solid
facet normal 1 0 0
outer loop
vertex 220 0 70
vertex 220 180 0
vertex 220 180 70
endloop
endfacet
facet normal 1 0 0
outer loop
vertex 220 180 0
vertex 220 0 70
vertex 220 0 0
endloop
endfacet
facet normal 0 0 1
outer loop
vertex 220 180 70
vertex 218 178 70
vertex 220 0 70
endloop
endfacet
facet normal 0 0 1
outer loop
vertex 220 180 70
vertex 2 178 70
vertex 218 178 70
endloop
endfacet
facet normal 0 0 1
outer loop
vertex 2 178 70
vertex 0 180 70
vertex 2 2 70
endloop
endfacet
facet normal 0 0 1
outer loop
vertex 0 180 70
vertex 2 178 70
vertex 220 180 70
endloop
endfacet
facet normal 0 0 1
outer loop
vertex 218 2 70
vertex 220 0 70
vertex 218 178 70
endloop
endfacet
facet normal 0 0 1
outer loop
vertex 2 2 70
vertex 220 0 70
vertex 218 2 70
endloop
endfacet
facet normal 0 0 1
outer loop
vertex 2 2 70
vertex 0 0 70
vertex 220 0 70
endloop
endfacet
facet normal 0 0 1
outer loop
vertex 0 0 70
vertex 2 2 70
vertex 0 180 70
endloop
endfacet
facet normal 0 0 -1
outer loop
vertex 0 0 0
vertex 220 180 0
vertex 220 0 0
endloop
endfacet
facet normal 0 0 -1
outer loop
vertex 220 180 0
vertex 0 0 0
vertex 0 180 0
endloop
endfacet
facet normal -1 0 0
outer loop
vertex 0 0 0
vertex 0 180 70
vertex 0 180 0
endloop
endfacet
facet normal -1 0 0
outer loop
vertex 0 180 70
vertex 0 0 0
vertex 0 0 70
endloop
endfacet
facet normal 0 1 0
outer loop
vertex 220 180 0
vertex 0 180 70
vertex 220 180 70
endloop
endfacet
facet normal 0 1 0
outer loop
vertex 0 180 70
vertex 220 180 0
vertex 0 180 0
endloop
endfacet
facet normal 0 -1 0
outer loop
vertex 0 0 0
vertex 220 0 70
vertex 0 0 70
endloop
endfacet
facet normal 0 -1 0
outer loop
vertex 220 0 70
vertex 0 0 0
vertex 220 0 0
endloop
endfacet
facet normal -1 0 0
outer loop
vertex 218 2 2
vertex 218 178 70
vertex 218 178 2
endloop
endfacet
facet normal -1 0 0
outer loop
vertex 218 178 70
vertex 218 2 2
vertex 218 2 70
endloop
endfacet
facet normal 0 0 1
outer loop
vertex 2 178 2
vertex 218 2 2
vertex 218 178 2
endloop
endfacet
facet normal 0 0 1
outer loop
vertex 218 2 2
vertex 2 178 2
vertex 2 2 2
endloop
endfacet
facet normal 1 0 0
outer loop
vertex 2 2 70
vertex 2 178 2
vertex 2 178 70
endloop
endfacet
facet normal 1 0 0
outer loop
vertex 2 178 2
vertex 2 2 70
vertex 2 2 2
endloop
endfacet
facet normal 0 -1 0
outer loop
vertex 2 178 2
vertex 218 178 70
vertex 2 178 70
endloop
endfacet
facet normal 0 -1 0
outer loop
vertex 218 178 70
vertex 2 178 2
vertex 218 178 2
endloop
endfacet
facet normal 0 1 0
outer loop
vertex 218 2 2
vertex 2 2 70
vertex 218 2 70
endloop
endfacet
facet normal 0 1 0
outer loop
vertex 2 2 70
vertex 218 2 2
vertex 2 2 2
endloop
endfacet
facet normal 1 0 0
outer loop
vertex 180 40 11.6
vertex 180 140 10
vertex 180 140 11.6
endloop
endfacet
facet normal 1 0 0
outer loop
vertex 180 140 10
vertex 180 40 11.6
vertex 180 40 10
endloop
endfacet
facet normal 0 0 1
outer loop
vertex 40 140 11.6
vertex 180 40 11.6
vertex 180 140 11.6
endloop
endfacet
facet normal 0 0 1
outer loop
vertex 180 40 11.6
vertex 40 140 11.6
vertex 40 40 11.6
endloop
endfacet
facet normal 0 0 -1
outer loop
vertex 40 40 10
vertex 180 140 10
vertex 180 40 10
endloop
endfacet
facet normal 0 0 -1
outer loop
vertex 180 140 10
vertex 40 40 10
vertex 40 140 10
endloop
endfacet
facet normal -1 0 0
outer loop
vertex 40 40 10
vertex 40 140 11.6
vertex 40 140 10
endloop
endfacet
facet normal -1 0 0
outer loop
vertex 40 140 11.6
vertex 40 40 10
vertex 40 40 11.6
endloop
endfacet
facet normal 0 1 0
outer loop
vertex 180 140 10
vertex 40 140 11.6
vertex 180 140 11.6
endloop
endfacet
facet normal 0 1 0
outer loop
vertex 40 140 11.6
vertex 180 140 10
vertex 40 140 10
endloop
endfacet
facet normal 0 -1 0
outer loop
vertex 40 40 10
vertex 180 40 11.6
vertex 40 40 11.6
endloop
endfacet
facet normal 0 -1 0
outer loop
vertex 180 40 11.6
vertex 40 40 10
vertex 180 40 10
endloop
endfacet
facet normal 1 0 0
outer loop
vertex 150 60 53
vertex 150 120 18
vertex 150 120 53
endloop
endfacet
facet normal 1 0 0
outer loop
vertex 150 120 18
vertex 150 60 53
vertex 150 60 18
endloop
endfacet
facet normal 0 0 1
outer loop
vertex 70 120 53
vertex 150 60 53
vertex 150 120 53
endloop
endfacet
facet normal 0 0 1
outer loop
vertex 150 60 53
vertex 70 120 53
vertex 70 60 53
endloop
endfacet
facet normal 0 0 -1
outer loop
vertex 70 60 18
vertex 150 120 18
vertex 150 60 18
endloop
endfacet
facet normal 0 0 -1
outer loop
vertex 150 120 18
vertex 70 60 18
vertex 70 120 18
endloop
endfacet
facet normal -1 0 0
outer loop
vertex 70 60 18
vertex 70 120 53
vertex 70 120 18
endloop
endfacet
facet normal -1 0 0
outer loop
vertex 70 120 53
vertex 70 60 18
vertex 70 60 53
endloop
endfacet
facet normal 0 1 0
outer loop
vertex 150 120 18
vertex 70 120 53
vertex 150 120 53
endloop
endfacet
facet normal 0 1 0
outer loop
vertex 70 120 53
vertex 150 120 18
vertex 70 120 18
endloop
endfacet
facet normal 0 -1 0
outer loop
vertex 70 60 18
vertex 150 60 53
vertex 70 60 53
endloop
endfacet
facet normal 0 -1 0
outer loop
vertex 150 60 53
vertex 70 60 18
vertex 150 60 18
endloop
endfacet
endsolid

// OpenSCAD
// V0.1 SPACE STUDY ONLY. Units: mm. No fabrication-ready holes or tolerances.
// All dimensions are project assumptions, not verified component dimensions.
case_w = 220;
case_d = 180;
case_h = 70;
wall = 2;
pcb_w = 140;
pcb_d = 100;
pcb_t = 1.6;
pcb_z = 10;
sink_w = 80;
sink_d = 60;
sink_h = 35;
sink_base_z = 18; // placeholder, not the actual IC contact height
show_lid = false;

assert(case_w > pcb_w + 2*wall && case_d > pcb_d + 2*wall);
assert(case_h > sink_base_z + sink_h + wall);

color([0.7,0.72,0.75,0.3]) difference() {
    cube([case_w,case_d,case_h]);
    translate([wall,wall,wall])
        cube([case_w-2*wall,case_d-2*wall,case_h]);
}
color("green") translate([(case_w-pcb_w)/2,(case_d-pcb_d)/2,pcb_z])
    cube([pcb_w,pcb_d,pcb_t]);
color([0.2,0.2,0.2,0.7])
    translate([(case_w-sink_w)/2,(case_d-sink_d)/2,sink_base_z])
        cube([sink_w,sink_d,sink_h]);
if (show_lid) color([0.7,0.72,0.75,0.3])
    translate([0,0,case_h]) cube([case_w,case_d,wall]);
